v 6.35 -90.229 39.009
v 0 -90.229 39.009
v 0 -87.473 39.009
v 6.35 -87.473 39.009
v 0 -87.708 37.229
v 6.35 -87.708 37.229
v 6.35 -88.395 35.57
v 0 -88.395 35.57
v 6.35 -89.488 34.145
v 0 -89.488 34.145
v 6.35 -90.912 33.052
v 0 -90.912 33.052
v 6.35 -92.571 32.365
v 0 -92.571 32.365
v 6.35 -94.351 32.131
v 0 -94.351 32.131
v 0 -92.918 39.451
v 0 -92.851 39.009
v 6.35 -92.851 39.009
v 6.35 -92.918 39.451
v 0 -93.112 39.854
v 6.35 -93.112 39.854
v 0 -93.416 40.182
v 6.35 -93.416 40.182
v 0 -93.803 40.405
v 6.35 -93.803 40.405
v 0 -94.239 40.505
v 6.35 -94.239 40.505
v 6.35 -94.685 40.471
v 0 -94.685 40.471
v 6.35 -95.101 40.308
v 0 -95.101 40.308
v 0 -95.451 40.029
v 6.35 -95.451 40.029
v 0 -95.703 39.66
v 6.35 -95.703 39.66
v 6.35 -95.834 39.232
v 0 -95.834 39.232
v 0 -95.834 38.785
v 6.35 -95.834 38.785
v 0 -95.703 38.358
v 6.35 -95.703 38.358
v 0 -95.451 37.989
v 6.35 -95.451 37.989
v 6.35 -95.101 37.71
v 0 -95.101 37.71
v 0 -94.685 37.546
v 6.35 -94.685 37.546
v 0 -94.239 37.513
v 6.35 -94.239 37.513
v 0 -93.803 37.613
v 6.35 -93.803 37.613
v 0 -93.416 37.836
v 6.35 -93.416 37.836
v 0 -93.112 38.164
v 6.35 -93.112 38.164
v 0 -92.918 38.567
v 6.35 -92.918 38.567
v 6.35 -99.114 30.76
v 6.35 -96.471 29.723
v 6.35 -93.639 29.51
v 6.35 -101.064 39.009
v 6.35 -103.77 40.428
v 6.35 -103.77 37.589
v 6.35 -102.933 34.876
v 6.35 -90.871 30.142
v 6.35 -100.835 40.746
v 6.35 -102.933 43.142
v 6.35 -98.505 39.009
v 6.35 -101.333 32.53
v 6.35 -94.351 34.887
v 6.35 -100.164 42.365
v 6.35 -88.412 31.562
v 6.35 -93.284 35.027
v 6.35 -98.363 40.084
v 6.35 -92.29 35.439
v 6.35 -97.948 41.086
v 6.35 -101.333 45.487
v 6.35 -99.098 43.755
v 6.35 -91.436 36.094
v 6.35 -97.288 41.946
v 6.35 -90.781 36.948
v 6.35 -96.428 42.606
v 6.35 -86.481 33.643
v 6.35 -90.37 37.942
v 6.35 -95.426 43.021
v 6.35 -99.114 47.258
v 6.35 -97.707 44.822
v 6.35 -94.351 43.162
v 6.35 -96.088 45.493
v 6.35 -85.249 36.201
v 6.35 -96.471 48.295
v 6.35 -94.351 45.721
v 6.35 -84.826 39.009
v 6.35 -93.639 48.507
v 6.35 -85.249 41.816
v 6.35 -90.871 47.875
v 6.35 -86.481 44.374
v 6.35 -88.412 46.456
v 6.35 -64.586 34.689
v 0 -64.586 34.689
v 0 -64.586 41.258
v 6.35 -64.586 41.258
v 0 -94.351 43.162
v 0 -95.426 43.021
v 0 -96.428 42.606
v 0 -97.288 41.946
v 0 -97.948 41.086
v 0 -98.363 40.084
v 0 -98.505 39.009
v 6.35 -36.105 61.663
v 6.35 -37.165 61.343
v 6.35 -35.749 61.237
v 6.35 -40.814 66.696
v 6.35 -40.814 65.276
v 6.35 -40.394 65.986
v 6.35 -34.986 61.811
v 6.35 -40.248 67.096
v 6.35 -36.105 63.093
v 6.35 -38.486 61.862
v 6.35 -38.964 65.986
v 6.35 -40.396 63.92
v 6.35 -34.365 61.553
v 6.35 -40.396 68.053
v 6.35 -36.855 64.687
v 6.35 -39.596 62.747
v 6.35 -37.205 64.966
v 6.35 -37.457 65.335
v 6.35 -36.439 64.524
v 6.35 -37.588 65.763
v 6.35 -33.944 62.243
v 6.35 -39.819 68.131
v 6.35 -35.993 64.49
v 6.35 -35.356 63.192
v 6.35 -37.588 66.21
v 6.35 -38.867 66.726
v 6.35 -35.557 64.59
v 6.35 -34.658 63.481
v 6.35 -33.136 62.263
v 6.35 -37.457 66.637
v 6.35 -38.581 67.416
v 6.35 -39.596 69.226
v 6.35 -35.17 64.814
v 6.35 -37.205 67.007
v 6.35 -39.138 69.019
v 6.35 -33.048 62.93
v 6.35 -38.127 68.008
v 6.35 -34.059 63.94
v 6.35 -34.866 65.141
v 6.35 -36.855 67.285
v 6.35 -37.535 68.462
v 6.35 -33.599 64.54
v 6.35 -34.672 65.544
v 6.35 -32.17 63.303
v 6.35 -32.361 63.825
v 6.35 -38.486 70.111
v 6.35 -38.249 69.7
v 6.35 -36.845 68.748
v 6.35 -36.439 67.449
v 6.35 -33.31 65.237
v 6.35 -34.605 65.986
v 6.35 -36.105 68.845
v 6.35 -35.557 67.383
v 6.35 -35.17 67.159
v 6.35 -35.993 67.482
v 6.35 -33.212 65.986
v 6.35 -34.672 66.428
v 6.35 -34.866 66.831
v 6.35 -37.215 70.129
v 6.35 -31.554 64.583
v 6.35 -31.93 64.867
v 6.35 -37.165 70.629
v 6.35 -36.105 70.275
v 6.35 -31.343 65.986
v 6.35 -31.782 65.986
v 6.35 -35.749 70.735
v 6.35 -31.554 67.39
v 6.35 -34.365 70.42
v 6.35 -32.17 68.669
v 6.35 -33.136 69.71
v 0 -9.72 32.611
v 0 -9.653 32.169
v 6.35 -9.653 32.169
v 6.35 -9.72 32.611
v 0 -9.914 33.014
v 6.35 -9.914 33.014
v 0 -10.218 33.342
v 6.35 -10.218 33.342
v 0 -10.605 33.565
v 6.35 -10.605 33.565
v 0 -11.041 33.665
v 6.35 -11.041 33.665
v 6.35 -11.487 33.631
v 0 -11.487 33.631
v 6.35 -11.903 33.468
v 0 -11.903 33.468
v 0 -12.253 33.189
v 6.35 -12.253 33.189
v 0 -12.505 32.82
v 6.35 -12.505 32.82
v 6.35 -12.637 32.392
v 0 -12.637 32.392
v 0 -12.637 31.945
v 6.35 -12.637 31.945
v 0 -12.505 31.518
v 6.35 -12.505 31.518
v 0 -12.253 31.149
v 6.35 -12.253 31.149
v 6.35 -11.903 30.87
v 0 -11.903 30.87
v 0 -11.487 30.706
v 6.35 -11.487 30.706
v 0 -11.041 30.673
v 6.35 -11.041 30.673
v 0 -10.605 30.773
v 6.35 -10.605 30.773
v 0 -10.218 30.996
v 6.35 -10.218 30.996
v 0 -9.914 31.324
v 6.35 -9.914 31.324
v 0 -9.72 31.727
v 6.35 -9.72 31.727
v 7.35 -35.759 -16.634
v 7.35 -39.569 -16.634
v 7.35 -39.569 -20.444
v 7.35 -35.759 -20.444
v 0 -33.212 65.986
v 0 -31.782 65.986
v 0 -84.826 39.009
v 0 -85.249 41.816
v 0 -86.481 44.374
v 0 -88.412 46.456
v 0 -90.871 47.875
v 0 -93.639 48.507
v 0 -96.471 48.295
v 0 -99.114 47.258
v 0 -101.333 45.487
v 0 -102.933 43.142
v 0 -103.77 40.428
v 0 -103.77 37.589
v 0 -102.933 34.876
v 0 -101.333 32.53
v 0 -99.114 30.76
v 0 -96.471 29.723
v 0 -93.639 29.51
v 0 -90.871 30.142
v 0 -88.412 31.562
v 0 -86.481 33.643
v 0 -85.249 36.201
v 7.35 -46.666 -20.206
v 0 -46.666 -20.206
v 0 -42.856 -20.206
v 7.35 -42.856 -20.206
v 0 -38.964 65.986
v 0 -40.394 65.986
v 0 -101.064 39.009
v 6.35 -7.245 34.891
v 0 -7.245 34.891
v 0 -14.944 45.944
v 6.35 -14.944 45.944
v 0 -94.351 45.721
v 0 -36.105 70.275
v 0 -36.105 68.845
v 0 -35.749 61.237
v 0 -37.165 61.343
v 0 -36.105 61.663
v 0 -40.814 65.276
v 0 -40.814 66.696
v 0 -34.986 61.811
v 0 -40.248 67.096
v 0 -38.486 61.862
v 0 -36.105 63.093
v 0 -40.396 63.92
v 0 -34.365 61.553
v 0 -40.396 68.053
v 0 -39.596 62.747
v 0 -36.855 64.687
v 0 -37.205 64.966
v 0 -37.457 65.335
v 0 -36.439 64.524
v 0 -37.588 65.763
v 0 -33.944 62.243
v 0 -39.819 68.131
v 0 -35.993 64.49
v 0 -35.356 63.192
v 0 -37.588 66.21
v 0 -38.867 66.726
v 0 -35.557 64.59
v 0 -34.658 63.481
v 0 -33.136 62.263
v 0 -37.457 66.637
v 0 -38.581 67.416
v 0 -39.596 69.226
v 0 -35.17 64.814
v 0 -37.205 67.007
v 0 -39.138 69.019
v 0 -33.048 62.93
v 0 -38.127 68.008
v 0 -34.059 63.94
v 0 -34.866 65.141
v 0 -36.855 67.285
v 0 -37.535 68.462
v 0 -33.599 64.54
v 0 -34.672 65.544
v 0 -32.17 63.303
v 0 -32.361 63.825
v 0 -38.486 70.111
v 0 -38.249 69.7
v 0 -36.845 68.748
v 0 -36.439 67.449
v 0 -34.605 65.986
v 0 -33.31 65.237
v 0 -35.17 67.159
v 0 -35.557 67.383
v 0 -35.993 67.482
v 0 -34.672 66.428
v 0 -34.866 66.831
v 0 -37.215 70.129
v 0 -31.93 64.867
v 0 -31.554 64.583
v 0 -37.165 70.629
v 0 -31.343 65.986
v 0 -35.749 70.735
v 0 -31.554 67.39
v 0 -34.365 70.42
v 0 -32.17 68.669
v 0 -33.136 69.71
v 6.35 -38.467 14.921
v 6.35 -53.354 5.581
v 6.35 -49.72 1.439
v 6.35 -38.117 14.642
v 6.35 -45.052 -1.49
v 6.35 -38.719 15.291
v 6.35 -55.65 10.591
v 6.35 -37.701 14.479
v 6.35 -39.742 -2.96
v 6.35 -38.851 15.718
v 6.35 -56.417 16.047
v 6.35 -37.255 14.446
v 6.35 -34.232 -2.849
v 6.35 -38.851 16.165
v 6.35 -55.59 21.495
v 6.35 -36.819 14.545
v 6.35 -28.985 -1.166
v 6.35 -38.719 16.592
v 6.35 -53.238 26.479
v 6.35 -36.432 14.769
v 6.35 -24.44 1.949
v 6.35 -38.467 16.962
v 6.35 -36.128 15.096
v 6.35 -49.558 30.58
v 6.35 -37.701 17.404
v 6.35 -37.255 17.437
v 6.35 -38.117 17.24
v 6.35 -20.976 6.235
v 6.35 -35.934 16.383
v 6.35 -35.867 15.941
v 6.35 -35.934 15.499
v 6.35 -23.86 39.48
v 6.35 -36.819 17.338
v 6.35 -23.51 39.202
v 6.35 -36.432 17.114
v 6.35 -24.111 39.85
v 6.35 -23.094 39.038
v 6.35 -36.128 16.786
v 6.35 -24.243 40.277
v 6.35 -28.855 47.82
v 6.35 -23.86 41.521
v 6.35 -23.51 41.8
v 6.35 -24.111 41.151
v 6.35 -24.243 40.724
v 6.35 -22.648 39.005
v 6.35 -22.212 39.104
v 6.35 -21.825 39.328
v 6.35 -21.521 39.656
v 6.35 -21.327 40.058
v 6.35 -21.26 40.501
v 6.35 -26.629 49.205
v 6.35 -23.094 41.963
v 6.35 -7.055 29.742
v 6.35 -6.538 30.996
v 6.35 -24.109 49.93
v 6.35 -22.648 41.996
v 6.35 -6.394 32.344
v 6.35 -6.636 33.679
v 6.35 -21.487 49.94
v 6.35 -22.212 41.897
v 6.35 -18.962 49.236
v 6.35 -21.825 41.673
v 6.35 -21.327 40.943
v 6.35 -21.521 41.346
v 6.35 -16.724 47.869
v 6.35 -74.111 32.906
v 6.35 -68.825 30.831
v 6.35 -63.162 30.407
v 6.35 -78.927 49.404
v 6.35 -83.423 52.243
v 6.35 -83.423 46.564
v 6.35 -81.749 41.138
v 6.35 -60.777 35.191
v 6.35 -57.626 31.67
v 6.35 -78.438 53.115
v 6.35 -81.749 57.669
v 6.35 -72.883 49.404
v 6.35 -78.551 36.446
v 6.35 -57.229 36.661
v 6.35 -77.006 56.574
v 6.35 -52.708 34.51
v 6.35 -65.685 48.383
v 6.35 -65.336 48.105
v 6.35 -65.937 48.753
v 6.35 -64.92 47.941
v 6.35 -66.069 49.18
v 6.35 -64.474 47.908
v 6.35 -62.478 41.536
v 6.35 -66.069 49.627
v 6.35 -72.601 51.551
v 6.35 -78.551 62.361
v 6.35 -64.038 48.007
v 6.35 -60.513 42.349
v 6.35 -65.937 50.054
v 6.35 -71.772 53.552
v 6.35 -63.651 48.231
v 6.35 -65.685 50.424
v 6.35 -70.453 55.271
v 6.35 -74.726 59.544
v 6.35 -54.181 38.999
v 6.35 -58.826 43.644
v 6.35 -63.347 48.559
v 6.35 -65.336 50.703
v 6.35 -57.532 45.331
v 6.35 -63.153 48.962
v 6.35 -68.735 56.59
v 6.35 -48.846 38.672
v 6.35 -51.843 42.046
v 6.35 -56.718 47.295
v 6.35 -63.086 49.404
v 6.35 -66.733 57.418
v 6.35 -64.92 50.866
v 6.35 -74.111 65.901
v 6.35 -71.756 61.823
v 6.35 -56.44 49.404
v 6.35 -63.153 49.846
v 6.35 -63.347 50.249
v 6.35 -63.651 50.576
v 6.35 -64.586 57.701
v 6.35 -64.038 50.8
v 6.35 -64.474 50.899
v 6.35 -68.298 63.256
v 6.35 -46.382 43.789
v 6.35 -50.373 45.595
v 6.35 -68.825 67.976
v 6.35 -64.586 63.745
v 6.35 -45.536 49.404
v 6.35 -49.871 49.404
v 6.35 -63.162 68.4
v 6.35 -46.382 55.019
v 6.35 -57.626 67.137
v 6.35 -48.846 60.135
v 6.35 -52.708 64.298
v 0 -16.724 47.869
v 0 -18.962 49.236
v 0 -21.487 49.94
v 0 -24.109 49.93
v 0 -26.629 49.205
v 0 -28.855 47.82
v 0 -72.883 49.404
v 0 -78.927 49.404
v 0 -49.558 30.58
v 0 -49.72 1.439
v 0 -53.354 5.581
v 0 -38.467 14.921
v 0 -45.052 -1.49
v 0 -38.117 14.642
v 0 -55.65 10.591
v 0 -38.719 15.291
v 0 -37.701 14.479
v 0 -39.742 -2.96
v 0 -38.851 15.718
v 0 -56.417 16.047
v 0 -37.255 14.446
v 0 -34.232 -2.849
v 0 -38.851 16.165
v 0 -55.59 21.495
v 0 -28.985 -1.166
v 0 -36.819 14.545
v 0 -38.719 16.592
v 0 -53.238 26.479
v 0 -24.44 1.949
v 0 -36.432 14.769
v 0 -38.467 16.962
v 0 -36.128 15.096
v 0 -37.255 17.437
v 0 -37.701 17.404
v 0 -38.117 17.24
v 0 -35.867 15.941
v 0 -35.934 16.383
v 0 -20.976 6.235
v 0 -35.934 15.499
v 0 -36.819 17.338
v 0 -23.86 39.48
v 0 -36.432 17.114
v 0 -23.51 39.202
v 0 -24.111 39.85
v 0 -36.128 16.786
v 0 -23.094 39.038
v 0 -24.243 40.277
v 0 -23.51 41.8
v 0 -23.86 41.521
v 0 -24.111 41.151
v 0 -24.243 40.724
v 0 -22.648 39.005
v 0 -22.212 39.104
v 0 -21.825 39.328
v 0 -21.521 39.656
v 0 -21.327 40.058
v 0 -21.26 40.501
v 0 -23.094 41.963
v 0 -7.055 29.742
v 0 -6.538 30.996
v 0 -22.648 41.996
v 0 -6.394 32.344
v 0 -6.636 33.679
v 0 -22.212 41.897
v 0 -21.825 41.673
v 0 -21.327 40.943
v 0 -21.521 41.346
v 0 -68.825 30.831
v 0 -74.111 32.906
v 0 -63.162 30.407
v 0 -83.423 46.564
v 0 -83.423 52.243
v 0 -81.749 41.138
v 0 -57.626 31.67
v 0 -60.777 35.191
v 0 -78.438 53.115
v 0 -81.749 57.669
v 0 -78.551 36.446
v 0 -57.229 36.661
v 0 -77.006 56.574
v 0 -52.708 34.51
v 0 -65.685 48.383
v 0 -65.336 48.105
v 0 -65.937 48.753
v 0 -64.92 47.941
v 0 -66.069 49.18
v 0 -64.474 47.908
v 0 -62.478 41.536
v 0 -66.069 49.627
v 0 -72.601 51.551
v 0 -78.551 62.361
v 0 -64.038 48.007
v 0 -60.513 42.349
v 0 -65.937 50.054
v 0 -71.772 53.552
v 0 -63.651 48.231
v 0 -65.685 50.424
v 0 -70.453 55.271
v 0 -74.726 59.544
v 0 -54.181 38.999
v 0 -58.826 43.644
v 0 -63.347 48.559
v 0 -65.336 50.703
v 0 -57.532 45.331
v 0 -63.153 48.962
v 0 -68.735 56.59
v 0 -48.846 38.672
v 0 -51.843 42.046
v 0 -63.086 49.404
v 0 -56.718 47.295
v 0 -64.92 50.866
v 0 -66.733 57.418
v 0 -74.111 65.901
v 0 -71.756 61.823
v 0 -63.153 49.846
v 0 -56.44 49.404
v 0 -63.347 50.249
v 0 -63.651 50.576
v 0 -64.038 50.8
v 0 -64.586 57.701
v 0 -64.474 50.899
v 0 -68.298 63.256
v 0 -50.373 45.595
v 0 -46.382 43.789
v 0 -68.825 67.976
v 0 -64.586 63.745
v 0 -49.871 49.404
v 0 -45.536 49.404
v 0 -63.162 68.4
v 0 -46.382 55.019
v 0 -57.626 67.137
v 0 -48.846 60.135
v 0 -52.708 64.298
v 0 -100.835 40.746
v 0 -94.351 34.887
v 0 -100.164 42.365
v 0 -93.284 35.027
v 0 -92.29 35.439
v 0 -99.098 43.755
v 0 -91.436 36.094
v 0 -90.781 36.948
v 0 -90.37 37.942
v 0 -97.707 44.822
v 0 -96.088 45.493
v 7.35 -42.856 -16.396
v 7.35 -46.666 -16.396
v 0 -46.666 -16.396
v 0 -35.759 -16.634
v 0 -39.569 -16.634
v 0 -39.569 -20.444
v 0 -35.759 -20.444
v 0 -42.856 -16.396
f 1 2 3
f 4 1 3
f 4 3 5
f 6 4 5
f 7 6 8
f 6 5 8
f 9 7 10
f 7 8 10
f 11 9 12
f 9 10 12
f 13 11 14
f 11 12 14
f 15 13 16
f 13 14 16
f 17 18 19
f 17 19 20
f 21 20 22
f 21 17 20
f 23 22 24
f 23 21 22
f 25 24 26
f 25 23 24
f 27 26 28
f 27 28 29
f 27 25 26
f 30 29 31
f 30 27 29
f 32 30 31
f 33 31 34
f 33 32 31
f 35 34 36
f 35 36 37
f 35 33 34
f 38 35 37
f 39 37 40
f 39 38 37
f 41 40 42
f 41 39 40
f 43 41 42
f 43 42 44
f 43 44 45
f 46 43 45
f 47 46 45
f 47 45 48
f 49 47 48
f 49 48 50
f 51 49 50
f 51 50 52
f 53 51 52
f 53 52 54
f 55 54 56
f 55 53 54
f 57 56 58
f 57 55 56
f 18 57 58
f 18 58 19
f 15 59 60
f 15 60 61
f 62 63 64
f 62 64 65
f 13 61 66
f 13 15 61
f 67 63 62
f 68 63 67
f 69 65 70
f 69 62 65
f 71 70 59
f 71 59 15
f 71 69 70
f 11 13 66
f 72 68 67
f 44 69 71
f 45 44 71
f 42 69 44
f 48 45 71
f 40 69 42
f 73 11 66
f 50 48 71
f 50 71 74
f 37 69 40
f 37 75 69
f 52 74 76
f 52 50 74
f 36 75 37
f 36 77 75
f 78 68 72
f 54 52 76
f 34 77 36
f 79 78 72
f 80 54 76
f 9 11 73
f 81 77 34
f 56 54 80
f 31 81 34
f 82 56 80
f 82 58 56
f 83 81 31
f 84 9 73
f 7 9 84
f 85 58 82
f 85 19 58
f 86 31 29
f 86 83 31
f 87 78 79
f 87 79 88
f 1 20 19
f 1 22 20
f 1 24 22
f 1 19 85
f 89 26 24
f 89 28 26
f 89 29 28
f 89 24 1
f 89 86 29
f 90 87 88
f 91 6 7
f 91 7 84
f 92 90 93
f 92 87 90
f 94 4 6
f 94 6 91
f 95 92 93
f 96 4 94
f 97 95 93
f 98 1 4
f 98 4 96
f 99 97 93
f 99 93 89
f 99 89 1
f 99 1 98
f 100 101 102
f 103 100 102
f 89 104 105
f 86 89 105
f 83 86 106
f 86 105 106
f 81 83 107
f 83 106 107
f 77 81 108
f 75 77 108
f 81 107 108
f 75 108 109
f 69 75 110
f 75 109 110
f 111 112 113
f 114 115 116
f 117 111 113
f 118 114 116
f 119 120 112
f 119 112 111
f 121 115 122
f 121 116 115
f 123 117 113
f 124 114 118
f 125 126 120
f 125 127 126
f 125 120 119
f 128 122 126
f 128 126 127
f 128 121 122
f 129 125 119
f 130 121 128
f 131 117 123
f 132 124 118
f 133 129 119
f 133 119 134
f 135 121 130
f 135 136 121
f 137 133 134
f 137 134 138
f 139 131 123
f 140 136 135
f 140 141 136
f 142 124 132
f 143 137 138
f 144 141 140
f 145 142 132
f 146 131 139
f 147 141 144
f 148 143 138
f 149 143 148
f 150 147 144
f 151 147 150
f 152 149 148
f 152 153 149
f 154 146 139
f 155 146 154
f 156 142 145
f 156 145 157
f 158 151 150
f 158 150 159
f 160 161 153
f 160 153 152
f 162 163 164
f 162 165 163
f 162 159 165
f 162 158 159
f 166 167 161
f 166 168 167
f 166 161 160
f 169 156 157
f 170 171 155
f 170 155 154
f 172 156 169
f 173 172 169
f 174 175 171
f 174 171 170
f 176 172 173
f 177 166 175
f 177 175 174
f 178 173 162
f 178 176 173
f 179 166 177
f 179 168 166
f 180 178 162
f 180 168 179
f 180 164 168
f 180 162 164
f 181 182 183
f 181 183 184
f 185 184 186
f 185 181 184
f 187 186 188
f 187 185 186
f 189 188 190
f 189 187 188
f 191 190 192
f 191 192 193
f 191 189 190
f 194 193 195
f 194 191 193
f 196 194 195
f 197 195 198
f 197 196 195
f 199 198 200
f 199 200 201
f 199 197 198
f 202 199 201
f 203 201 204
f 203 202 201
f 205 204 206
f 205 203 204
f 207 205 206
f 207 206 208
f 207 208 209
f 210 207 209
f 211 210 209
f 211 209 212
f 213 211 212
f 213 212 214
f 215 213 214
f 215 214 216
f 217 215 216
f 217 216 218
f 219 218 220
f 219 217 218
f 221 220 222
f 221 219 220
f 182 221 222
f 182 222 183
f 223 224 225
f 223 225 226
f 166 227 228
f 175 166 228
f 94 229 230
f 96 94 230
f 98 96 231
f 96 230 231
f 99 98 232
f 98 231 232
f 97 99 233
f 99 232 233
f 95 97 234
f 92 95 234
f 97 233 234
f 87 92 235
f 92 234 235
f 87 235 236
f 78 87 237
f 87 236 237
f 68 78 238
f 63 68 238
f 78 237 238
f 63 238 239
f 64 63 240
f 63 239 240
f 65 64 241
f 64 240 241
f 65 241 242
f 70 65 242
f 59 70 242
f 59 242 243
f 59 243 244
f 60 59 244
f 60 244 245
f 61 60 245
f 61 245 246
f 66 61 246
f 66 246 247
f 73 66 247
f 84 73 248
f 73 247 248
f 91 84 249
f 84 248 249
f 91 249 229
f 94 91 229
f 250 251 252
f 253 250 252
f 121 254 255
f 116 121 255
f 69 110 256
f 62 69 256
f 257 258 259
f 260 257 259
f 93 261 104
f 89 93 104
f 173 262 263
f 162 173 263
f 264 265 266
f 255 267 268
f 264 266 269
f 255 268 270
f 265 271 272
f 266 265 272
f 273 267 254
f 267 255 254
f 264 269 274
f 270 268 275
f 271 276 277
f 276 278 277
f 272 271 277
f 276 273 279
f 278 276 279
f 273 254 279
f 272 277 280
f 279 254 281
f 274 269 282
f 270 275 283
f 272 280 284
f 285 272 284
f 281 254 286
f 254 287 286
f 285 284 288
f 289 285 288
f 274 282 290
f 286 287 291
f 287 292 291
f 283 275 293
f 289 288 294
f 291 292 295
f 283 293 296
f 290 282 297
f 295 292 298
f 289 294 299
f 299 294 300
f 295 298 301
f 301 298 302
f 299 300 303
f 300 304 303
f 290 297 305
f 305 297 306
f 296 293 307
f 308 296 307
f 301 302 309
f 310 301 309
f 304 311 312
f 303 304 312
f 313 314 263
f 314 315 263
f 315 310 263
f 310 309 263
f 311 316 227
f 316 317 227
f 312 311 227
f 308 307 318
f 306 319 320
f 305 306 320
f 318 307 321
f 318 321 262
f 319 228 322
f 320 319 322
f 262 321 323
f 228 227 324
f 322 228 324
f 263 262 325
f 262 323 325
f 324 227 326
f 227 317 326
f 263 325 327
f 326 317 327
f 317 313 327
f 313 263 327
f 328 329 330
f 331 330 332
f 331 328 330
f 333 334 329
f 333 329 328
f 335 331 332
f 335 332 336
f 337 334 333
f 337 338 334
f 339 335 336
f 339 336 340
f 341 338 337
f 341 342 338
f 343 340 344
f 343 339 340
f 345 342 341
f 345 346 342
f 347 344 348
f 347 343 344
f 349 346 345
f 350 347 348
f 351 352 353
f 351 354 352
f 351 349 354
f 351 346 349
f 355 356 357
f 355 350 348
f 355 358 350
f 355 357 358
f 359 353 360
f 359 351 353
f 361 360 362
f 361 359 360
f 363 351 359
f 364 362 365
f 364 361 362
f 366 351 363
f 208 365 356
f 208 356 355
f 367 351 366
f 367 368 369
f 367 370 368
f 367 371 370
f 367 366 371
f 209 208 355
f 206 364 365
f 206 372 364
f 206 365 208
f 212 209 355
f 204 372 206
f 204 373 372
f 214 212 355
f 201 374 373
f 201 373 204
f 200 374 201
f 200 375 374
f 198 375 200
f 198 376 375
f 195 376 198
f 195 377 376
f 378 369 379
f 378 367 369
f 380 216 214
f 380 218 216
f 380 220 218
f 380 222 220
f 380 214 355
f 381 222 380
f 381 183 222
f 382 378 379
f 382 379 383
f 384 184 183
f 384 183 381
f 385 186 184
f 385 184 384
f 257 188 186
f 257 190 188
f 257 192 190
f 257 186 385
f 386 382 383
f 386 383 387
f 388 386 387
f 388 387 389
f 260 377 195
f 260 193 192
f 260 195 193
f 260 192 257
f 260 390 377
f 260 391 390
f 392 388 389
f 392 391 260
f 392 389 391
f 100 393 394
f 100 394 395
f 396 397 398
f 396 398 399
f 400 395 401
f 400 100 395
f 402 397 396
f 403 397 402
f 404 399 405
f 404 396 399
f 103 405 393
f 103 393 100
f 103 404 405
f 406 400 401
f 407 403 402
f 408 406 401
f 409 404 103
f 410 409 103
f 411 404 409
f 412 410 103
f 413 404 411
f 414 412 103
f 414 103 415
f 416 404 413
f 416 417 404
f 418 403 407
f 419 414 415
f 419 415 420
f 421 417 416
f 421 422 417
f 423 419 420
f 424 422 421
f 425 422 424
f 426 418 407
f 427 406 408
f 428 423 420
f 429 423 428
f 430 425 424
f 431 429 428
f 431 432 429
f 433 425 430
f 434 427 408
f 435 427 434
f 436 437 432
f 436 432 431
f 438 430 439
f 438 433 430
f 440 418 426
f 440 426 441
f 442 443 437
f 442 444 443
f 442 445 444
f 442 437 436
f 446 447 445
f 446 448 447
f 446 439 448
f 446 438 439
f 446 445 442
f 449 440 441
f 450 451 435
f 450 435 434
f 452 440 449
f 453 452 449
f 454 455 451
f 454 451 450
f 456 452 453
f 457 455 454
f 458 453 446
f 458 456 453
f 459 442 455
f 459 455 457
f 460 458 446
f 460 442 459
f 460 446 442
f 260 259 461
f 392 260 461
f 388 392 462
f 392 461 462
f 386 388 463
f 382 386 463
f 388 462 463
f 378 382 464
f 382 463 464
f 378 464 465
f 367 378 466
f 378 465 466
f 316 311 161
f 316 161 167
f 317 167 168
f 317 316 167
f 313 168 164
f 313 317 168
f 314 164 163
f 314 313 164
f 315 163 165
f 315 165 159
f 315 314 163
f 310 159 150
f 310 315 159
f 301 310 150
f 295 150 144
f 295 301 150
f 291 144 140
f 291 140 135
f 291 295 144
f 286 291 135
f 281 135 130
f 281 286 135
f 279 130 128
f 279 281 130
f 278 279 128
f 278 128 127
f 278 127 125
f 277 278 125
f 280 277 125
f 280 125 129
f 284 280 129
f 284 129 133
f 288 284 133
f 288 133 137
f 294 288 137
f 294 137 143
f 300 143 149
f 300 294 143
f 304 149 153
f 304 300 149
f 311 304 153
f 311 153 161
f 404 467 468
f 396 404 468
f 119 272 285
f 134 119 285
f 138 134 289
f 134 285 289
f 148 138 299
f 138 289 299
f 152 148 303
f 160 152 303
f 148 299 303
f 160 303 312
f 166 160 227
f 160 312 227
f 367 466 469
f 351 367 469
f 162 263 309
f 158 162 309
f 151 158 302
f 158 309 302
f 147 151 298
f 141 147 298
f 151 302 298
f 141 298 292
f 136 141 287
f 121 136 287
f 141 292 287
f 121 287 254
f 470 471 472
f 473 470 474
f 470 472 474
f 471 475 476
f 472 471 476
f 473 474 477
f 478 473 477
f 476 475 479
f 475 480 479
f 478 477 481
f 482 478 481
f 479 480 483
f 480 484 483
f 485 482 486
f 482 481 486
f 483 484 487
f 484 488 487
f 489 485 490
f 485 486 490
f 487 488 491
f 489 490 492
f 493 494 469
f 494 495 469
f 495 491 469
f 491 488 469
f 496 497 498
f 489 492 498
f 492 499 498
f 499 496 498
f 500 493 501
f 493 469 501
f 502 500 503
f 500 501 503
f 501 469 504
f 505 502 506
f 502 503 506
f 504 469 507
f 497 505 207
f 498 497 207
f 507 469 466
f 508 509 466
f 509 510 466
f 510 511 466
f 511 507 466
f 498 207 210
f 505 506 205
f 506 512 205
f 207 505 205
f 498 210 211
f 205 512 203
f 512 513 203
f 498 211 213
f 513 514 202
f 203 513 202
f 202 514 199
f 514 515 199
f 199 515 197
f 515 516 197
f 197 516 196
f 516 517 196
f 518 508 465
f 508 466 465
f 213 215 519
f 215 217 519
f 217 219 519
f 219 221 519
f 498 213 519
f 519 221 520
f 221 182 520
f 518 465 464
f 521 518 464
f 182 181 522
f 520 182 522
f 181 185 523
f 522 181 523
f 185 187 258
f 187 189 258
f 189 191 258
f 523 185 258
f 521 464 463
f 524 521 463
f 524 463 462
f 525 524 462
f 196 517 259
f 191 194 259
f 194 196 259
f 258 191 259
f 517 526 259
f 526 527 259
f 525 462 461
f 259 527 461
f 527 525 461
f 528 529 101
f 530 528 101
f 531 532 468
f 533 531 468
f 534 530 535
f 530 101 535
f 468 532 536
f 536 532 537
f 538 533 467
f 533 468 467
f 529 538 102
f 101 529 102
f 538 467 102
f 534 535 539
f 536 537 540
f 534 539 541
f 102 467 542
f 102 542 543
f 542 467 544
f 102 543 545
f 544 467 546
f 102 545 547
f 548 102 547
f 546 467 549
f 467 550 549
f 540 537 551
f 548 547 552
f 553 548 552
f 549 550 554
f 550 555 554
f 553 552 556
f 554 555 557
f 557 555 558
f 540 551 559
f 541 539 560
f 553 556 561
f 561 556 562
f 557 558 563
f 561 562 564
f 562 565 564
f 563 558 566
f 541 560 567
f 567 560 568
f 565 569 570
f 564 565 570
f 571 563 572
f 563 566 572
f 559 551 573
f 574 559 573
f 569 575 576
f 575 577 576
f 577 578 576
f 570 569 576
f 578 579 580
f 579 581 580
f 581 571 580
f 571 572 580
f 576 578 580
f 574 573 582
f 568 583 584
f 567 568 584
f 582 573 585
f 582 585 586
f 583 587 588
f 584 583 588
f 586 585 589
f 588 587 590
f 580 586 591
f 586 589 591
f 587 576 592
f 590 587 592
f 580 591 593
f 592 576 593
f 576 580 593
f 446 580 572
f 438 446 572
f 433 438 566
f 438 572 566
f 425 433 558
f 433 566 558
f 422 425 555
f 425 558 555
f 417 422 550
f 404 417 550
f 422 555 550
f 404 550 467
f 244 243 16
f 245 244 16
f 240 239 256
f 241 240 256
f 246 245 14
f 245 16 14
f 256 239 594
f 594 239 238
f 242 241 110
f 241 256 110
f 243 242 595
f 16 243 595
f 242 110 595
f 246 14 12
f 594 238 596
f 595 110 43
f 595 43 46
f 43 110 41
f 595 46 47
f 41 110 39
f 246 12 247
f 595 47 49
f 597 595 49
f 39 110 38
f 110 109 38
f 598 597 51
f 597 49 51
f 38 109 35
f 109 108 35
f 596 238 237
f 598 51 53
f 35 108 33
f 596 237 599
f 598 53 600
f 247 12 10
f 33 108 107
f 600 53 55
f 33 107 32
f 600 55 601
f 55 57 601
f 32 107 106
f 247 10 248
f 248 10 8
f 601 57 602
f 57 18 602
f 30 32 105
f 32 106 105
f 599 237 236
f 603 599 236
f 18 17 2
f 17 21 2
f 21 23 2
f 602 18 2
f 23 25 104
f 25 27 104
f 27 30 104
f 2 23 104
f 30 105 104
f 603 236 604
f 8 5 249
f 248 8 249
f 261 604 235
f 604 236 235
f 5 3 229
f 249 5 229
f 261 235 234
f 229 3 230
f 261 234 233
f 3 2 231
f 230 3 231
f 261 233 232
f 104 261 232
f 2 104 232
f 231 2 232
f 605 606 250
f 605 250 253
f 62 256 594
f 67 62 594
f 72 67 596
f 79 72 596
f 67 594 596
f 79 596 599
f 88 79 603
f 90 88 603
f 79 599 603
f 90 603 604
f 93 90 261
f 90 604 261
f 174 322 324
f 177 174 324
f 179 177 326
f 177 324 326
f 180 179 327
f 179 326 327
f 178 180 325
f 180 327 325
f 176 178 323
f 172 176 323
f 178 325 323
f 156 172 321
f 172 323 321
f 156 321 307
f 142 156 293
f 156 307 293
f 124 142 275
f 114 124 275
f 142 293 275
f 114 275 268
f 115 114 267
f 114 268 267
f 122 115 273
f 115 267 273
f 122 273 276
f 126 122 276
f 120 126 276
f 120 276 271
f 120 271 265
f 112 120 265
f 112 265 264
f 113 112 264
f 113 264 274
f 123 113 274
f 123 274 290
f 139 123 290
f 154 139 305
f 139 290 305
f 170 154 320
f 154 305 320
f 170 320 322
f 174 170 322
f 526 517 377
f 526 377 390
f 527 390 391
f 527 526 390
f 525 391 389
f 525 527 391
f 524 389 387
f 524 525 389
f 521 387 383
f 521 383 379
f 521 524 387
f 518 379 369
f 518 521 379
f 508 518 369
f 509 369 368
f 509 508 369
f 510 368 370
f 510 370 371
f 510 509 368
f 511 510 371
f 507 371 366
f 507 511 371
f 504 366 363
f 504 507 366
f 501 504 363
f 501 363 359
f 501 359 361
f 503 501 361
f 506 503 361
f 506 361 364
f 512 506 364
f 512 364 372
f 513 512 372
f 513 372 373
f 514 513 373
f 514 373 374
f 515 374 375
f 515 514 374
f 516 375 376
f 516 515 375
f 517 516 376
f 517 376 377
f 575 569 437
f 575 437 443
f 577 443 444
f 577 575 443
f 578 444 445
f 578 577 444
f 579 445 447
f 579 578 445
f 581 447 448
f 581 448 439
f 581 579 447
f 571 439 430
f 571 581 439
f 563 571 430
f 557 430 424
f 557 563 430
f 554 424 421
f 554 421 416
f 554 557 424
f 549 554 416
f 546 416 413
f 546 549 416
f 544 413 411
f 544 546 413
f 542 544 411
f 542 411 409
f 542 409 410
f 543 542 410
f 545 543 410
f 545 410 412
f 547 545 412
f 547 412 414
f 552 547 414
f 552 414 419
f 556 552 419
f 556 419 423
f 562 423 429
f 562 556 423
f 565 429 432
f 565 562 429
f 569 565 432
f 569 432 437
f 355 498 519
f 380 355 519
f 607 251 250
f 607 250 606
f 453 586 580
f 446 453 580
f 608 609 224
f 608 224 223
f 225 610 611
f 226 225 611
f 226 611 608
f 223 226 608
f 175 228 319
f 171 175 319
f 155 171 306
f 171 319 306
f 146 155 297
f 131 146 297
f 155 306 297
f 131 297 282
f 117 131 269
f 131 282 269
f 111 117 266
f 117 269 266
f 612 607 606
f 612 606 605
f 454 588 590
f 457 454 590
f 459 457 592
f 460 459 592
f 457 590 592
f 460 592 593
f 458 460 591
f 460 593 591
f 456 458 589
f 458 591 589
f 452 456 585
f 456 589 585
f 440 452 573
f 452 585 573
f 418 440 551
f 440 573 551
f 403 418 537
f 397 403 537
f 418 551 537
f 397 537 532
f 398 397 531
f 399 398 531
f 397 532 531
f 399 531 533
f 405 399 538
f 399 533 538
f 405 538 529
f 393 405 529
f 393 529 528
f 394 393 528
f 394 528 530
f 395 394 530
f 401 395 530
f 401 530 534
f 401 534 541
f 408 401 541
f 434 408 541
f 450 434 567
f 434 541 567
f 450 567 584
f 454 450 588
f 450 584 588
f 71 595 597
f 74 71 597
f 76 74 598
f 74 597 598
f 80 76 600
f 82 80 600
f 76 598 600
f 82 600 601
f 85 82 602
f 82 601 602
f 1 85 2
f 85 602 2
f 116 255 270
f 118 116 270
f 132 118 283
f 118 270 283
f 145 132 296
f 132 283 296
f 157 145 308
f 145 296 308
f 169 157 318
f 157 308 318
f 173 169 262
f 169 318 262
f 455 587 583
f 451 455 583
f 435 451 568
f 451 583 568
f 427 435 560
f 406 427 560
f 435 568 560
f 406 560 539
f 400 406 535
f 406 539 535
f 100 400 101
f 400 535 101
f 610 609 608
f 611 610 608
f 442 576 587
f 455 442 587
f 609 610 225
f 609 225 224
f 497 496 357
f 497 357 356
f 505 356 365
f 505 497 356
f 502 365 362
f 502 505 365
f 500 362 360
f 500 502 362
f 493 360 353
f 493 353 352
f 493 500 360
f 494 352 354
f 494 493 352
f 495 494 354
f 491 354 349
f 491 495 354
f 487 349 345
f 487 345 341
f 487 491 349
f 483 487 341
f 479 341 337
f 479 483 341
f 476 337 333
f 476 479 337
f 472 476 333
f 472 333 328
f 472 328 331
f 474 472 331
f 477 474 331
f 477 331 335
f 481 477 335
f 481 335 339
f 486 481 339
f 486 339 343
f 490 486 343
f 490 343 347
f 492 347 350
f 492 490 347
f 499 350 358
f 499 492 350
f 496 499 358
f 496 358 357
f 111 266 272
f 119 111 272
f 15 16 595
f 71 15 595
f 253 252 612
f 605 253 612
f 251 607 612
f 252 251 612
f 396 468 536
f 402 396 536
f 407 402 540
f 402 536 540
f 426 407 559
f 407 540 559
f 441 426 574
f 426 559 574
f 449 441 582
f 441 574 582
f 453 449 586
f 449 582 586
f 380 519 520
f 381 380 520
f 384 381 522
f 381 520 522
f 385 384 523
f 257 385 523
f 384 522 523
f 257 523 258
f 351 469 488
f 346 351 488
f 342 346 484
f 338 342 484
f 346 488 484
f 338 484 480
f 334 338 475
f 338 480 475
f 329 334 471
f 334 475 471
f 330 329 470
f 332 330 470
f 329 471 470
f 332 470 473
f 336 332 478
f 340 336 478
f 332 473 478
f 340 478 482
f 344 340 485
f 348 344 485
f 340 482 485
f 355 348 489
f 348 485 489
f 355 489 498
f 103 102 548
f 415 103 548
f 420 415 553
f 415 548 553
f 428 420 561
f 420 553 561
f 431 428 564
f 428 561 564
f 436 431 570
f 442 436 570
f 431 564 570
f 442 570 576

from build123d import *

# Parameters (mm, degrees)
F0_R     = 1.499997
F0_R_2   = 9.525
F0_R_3   = 19.05
F0_R_4   = 4.7625
F1_DEPTH = 6.35
F2_W     = 3.81
F2_H     = 3.81
F3_DEPTH = 7.350001


with BuildPart() as f1:
    # F0 (on Right) → F1 (new body)
    with BuildSketch(Plane.YZ):
        with BuildLine():
            Line((-20.975642, 6.234786), (-7.0554, 29.742179))
            ThreePointArc((-7.0554, 29.742179), (-6.394042, 32.344319), (-7.245258, 34.890681))
            Line((-7.245258, 34.890681), (-14.943859, 45.944314))
            ThreePointArc((-14.943859, 45.944314), (-21.487185, 49.940161), (-28.855151, 47.820024))
            Line((-28.855151, 47.820024), (-49.557661, 30.580212))
            ThreePointArc((-49.557661, 30.580212), (-49.719906, 1.439088), (-20.975642, 6.234786))
        make_face()
        with Locations((-37.367273, 15.941327)):
            Circle(F0_R, mode=Mode.SUBTRACT)
        with Locations((-11.153307, 32.168815)):
            Circle(F0_R, mode=Mode.SUBTRACT)
        with Locations((-22.759957, 40.500581)):
            Circle(F0_R, mode=Mode.SUBTRACT)
        with Locations((-94.351119, 39.008833)):
            Circle(F0_R_2)
        with Locations((-94.351119, 39.008833)):
            Circle(F0_R, mode=Mode.SUBTRACT)
        with BuildLine():
            Line((-98.504625, 39.008833), (-101.063631, 39.008833))
            ThreePointArc((-101.063631, 39.008833), (-99.097582, 43.755296), (-94.351119, 45.721345))
            Line((-94.351119, 45.721345), (-94.351119, 43.162339))
            ThreePointArc((-94.351119, 43.162339), (-97.288091, 41.945805), (-98.504625, 39.008833))
        make_face(mode=Mode.SUBTRACT)
        with BuildLine():
            ThreePointArc((-87.473325, 39.008833), (-89.487784, 34.145498), (-94.351119, 32.131039))
            Line((-94.351119, 32.131039), (-94.351119, 34.886889))
            ThreePointArc((-94.351119, 34.886889), (-91.436465, 36.094179), (-90.229175, 39.008833))
            Line((-90.229175, 39.008833), (-87.473325, 39.008833))
        make_face(mode=Mode.SUBTRACT)
        with Locations((-64.585872, 49.403638)):
            Circle(F0_R_3)
        with BuildLine():
            Line((-64.585872, 34.689154), (-64.585872, 41.258119))
            ThreePointArc((-64.585872, 41.258119), (-58.826121, 43.643886), (-56.440353, 49.403638))
            Line((-56.440353, 49.403638), (-49.871389, 49.403638))
            ThreePointArc((-49.871389, 49.403638), (-54.181161, 38.998927), (-64.585872, 34.689154))
        make_face(mode=Mode.SUBTRACT)
        with Locations((-64.585872, 49.403638)):
            Circle(F0_R, mode=Mode.SUBTRACT)
        with BuildLine():
            ThreePointArc((-64.585872, 57.7012), (-70.453135, 55.2709), (-72.883435, 49.403638))
            Line((-72.883435, 49.403638), (-78.926884, 49.403638))
            ThreePointArc((-78.926884, 49.403638), (-74.726499, 59.544264), (-64.585872, 63.744649))
            Line((-64.585872, 63.744649), (-64.585872, 57.7012))
        make_face(mode=Mode.SUBTRACT)
        with Locations((-36.105146, 65.986276)):
            Circle(F0_R_4)
        with BuildLine():
            Line((-36.105146, 61.663408), (-36.105146, 63.09294))
            ThreePointArc((-36.105146, 63.09294), (-34.059248, 63.940378), (-33.211809, 65.986276))
            Line((-33.211809, 65.986276), (-31.782278, 65.986276))
            ThreePointArc((-31.782278, 65.986276), (-33.048417, 62.929547), (-36.105146, 61.663408))
        make_face(mode=Mode.SUBTRACT)
        with Locations((-36.105146, 65.986276)):
            Circle(F0_R, mode=Mode.SUBTRACT)
        with BuildLine():
            ThreePointArc((-36.105146, 68.845264), (-38.126756, 68.007886), (-38.964134, 65.986276))
            Line((-38.964134, 65.986276), (-40.393669, 65.986276))
            ThreePointArc((-40.393669, 65.986276), (-39.13759, 69.01872), (-36.105146, 70.274799))
            Line((-36.105146, 70.274799), (-36.105146, 68.845264))
        make_face(mode=Mode.SUBTRACT)
    extrude(amount=F1_DEPTH)


with BuildPart() as f3:
    # F2 (on Right) → F3 (new body)
    with BuildSketch(Plane.YZ):
        with Locations((-44.760511, -18.301278)):
            Rectangle(F2_W, F2_H)
        with Locations((-37.664384, -18.539403)):
            Rectangle(F2_W, F2_H)
    extrude(amount=F3_DEPTH)


solid = Compound([f1.part, f3.part])
